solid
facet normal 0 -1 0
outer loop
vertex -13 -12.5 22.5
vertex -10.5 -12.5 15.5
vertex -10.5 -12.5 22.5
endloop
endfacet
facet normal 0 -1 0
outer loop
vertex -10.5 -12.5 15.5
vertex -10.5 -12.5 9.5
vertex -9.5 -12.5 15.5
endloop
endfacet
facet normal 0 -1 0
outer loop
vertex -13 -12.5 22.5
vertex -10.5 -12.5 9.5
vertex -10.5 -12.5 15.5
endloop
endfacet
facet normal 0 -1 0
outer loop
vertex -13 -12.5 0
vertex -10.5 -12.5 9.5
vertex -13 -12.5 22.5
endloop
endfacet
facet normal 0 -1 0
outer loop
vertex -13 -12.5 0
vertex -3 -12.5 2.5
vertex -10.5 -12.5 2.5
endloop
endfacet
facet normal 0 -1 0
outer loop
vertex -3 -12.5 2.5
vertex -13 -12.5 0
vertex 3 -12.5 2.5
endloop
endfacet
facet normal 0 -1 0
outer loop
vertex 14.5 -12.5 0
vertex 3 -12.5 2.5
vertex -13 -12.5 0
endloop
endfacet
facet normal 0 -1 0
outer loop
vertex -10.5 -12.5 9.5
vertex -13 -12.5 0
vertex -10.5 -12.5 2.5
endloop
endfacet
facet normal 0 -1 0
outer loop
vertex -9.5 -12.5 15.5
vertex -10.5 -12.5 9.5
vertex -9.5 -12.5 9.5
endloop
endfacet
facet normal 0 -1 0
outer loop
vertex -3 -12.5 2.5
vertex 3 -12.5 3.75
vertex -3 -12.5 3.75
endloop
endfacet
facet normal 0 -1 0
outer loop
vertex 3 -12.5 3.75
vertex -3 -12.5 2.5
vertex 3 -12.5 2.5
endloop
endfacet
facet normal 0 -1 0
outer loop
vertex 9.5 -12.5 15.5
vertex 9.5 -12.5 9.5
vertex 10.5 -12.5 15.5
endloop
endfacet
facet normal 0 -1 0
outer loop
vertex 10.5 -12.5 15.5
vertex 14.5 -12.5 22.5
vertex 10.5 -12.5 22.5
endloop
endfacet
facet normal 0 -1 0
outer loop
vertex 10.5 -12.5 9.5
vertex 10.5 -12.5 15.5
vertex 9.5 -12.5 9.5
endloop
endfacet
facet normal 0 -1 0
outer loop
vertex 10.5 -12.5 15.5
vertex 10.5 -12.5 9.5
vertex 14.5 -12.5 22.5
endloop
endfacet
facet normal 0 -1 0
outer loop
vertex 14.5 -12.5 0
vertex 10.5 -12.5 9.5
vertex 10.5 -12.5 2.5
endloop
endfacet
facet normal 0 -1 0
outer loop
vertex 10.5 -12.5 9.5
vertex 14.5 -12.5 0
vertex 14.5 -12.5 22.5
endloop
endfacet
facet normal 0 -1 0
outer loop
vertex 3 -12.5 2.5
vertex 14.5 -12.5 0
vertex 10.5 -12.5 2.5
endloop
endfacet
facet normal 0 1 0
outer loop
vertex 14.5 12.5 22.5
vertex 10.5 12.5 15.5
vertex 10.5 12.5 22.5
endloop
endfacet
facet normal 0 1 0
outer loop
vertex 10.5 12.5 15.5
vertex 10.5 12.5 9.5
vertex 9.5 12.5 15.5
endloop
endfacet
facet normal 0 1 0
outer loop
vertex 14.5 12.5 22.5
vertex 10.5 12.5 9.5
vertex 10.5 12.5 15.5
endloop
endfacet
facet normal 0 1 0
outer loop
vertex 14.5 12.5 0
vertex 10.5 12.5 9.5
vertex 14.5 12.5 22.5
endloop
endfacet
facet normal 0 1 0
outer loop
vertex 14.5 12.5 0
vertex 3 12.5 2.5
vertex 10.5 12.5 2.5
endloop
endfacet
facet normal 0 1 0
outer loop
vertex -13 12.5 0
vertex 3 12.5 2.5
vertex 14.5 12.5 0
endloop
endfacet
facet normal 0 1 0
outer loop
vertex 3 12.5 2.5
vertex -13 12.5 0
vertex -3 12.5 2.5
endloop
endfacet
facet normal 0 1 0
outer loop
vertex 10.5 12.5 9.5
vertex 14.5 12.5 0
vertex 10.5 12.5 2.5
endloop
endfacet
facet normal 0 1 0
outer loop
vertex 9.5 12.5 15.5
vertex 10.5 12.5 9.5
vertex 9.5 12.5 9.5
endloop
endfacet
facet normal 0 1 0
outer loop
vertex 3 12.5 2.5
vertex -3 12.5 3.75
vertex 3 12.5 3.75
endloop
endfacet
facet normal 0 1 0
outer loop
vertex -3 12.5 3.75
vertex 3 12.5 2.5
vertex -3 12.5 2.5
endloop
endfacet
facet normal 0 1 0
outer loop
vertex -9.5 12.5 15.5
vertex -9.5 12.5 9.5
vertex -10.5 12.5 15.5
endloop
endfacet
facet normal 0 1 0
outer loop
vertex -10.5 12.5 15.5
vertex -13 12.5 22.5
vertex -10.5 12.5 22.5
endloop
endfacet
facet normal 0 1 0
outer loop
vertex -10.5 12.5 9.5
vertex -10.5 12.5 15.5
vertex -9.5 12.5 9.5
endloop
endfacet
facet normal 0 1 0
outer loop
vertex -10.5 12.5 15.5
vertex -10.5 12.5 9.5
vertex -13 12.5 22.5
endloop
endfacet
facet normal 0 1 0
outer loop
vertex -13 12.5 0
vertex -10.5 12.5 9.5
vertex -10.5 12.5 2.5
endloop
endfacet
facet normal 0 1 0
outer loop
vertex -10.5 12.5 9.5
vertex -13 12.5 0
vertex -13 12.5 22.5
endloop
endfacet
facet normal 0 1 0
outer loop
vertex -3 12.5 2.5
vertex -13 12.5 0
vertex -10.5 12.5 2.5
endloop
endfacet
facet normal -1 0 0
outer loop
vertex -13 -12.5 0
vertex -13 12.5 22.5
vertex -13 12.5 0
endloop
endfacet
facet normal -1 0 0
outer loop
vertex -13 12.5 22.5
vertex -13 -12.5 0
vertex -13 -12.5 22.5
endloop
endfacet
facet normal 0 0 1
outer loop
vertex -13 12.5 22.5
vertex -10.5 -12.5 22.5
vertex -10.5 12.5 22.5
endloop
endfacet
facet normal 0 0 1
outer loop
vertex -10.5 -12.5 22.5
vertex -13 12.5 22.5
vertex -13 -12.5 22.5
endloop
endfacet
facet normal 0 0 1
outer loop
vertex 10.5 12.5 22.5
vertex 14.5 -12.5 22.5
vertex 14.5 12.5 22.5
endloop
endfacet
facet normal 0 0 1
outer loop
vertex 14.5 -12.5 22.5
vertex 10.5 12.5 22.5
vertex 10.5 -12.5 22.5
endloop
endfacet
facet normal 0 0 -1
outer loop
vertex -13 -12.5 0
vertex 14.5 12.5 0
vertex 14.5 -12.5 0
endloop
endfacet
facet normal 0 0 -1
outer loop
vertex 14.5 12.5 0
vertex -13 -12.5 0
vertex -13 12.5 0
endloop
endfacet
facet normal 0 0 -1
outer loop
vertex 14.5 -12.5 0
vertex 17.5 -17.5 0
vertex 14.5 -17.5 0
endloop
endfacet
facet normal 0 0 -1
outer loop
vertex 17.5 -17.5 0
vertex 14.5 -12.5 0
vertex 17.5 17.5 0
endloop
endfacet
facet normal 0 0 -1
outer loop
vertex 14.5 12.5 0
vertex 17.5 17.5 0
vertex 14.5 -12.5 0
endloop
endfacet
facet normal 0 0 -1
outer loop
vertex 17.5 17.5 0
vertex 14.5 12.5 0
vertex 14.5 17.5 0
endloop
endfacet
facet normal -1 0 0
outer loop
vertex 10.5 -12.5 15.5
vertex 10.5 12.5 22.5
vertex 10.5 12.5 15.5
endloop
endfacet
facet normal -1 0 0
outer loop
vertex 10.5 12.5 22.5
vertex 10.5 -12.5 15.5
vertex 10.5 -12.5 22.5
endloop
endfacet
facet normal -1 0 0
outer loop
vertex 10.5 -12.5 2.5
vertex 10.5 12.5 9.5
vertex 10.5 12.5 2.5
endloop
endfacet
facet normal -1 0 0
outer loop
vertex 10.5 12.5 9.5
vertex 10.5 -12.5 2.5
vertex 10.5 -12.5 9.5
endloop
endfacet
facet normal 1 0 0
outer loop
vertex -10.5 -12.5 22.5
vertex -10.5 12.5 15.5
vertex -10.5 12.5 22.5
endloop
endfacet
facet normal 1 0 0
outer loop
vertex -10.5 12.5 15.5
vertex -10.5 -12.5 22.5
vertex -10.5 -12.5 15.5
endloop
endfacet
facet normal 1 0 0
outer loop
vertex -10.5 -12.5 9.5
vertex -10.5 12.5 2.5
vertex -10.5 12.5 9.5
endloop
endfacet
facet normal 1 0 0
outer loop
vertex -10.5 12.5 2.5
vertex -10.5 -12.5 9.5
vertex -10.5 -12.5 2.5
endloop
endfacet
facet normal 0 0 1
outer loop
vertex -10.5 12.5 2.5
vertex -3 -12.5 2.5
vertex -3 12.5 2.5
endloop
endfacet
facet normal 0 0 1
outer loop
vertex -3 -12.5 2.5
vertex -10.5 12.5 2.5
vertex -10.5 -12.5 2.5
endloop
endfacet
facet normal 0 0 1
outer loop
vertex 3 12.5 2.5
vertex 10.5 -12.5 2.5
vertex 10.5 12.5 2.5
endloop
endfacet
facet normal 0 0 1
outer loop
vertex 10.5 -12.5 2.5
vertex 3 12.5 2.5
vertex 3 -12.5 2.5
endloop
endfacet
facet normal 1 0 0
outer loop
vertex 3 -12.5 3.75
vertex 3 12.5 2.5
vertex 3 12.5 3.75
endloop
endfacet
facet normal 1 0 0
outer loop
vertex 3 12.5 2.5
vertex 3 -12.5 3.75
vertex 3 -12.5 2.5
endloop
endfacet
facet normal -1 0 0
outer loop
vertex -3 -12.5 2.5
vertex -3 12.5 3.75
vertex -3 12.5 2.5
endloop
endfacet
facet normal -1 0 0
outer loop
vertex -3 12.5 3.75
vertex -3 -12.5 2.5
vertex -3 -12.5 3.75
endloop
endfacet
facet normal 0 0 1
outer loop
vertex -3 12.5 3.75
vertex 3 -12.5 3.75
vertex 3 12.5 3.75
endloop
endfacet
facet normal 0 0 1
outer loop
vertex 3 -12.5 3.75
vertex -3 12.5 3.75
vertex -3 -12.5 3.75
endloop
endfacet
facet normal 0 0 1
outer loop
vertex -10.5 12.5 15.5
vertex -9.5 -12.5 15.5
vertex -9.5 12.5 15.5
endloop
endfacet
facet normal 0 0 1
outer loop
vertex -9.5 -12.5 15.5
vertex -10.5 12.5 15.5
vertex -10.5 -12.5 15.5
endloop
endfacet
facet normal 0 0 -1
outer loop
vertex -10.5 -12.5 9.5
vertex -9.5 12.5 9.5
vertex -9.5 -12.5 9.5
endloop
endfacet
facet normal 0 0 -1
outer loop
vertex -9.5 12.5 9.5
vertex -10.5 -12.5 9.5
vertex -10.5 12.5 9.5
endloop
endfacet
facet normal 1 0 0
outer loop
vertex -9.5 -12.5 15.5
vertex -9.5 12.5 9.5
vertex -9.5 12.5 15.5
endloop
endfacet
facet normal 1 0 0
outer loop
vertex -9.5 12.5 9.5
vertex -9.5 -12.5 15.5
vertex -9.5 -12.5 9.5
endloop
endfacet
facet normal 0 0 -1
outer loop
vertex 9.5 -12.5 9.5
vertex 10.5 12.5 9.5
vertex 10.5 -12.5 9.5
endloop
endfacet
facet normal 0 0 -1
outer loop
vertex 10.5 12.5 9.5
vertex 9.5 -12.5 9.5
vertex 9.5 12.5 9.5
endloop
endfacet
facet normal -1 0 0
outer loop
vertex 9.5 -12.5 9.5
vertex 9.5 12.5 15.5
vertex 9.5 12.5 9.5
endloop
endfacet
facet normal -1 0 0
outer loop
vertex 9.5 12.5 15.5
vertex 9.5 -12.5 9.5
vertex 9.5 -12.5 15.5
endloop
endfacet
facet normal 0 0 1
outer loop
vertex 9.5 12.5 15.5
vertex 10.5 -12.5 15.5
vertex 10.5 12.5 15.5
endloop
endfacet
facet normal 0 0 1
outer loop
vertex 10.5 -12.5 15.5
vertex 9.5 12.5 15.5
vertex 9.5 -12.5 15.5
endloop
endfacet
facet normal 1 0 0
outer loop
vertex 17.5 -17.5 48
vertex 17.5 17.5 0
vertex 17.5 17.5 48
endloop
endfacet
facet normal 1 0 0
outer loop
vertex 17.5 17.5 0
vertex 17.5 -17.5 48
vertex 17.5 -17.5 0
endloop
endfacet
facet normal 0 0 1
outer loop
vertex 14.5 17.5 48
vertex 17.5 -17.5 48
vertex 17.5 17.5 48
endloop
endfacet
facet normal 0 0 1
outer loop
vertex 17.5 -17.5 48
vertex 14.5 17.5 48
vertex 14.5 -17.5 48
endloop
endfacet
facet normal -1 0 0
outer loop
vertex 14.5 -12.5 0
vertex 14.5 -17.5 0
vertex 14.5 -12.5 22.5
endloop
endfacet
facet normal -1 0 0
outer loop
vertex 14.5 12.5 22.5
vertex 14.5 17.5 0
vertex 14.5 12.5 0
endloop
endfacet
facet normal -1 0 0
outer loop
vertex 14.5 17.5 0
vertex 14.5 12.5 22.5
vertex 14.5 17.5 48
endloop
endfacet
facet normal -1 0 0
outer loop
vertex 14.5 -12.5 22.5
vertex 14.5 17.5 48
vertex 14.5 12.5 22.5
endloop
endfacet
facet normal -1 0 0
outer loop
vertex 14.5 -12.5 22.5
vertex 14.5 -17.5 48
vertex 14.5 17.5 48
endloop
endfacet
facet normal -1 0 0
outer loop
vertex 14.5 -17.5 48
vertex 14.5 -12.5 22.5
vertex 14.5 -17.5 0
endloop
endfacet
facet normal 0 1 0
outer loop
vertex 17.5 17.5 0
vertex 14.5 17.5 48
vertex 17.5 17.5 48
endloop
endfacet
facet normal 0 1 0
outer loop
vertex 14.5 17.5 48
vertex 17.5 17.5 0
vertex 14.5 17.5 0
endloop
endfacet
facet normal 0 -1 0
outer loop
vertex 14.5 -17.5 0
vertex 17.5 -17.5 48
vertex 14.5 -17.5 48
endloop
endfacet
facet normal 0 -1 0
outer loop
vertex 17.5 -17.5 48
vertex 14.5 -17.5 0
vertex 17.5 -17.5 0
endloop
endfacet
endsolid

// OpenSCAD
union()
{
  translate([0,0,11.25]) rotate([90,0,0]) clip();
  translate([16,0,24]) gopromount();
}

module gopromount()
{
  cube([3,35,48],center=true);
}

module clip()
{
  cliplen=25;
  union()
  {
    difference()
    {
      translate([1,0,0]) cube([26+2,22.5,cliplen],center=true);
      translate([0,3.75,0]) cube([21,25,cliplen+5],center=true);
    }
    translate([0,-8.5,0]) cube([6,2,cliplen],center=true);
    translate([-10.5,1.25,0]) rotate([0,0,90]) cube([6,2,cliplen],center=true);
    translate([10.5,1.25,0]) rotate([0,0,90]) cube([6,2,cliplen],center=true);
  }
}
